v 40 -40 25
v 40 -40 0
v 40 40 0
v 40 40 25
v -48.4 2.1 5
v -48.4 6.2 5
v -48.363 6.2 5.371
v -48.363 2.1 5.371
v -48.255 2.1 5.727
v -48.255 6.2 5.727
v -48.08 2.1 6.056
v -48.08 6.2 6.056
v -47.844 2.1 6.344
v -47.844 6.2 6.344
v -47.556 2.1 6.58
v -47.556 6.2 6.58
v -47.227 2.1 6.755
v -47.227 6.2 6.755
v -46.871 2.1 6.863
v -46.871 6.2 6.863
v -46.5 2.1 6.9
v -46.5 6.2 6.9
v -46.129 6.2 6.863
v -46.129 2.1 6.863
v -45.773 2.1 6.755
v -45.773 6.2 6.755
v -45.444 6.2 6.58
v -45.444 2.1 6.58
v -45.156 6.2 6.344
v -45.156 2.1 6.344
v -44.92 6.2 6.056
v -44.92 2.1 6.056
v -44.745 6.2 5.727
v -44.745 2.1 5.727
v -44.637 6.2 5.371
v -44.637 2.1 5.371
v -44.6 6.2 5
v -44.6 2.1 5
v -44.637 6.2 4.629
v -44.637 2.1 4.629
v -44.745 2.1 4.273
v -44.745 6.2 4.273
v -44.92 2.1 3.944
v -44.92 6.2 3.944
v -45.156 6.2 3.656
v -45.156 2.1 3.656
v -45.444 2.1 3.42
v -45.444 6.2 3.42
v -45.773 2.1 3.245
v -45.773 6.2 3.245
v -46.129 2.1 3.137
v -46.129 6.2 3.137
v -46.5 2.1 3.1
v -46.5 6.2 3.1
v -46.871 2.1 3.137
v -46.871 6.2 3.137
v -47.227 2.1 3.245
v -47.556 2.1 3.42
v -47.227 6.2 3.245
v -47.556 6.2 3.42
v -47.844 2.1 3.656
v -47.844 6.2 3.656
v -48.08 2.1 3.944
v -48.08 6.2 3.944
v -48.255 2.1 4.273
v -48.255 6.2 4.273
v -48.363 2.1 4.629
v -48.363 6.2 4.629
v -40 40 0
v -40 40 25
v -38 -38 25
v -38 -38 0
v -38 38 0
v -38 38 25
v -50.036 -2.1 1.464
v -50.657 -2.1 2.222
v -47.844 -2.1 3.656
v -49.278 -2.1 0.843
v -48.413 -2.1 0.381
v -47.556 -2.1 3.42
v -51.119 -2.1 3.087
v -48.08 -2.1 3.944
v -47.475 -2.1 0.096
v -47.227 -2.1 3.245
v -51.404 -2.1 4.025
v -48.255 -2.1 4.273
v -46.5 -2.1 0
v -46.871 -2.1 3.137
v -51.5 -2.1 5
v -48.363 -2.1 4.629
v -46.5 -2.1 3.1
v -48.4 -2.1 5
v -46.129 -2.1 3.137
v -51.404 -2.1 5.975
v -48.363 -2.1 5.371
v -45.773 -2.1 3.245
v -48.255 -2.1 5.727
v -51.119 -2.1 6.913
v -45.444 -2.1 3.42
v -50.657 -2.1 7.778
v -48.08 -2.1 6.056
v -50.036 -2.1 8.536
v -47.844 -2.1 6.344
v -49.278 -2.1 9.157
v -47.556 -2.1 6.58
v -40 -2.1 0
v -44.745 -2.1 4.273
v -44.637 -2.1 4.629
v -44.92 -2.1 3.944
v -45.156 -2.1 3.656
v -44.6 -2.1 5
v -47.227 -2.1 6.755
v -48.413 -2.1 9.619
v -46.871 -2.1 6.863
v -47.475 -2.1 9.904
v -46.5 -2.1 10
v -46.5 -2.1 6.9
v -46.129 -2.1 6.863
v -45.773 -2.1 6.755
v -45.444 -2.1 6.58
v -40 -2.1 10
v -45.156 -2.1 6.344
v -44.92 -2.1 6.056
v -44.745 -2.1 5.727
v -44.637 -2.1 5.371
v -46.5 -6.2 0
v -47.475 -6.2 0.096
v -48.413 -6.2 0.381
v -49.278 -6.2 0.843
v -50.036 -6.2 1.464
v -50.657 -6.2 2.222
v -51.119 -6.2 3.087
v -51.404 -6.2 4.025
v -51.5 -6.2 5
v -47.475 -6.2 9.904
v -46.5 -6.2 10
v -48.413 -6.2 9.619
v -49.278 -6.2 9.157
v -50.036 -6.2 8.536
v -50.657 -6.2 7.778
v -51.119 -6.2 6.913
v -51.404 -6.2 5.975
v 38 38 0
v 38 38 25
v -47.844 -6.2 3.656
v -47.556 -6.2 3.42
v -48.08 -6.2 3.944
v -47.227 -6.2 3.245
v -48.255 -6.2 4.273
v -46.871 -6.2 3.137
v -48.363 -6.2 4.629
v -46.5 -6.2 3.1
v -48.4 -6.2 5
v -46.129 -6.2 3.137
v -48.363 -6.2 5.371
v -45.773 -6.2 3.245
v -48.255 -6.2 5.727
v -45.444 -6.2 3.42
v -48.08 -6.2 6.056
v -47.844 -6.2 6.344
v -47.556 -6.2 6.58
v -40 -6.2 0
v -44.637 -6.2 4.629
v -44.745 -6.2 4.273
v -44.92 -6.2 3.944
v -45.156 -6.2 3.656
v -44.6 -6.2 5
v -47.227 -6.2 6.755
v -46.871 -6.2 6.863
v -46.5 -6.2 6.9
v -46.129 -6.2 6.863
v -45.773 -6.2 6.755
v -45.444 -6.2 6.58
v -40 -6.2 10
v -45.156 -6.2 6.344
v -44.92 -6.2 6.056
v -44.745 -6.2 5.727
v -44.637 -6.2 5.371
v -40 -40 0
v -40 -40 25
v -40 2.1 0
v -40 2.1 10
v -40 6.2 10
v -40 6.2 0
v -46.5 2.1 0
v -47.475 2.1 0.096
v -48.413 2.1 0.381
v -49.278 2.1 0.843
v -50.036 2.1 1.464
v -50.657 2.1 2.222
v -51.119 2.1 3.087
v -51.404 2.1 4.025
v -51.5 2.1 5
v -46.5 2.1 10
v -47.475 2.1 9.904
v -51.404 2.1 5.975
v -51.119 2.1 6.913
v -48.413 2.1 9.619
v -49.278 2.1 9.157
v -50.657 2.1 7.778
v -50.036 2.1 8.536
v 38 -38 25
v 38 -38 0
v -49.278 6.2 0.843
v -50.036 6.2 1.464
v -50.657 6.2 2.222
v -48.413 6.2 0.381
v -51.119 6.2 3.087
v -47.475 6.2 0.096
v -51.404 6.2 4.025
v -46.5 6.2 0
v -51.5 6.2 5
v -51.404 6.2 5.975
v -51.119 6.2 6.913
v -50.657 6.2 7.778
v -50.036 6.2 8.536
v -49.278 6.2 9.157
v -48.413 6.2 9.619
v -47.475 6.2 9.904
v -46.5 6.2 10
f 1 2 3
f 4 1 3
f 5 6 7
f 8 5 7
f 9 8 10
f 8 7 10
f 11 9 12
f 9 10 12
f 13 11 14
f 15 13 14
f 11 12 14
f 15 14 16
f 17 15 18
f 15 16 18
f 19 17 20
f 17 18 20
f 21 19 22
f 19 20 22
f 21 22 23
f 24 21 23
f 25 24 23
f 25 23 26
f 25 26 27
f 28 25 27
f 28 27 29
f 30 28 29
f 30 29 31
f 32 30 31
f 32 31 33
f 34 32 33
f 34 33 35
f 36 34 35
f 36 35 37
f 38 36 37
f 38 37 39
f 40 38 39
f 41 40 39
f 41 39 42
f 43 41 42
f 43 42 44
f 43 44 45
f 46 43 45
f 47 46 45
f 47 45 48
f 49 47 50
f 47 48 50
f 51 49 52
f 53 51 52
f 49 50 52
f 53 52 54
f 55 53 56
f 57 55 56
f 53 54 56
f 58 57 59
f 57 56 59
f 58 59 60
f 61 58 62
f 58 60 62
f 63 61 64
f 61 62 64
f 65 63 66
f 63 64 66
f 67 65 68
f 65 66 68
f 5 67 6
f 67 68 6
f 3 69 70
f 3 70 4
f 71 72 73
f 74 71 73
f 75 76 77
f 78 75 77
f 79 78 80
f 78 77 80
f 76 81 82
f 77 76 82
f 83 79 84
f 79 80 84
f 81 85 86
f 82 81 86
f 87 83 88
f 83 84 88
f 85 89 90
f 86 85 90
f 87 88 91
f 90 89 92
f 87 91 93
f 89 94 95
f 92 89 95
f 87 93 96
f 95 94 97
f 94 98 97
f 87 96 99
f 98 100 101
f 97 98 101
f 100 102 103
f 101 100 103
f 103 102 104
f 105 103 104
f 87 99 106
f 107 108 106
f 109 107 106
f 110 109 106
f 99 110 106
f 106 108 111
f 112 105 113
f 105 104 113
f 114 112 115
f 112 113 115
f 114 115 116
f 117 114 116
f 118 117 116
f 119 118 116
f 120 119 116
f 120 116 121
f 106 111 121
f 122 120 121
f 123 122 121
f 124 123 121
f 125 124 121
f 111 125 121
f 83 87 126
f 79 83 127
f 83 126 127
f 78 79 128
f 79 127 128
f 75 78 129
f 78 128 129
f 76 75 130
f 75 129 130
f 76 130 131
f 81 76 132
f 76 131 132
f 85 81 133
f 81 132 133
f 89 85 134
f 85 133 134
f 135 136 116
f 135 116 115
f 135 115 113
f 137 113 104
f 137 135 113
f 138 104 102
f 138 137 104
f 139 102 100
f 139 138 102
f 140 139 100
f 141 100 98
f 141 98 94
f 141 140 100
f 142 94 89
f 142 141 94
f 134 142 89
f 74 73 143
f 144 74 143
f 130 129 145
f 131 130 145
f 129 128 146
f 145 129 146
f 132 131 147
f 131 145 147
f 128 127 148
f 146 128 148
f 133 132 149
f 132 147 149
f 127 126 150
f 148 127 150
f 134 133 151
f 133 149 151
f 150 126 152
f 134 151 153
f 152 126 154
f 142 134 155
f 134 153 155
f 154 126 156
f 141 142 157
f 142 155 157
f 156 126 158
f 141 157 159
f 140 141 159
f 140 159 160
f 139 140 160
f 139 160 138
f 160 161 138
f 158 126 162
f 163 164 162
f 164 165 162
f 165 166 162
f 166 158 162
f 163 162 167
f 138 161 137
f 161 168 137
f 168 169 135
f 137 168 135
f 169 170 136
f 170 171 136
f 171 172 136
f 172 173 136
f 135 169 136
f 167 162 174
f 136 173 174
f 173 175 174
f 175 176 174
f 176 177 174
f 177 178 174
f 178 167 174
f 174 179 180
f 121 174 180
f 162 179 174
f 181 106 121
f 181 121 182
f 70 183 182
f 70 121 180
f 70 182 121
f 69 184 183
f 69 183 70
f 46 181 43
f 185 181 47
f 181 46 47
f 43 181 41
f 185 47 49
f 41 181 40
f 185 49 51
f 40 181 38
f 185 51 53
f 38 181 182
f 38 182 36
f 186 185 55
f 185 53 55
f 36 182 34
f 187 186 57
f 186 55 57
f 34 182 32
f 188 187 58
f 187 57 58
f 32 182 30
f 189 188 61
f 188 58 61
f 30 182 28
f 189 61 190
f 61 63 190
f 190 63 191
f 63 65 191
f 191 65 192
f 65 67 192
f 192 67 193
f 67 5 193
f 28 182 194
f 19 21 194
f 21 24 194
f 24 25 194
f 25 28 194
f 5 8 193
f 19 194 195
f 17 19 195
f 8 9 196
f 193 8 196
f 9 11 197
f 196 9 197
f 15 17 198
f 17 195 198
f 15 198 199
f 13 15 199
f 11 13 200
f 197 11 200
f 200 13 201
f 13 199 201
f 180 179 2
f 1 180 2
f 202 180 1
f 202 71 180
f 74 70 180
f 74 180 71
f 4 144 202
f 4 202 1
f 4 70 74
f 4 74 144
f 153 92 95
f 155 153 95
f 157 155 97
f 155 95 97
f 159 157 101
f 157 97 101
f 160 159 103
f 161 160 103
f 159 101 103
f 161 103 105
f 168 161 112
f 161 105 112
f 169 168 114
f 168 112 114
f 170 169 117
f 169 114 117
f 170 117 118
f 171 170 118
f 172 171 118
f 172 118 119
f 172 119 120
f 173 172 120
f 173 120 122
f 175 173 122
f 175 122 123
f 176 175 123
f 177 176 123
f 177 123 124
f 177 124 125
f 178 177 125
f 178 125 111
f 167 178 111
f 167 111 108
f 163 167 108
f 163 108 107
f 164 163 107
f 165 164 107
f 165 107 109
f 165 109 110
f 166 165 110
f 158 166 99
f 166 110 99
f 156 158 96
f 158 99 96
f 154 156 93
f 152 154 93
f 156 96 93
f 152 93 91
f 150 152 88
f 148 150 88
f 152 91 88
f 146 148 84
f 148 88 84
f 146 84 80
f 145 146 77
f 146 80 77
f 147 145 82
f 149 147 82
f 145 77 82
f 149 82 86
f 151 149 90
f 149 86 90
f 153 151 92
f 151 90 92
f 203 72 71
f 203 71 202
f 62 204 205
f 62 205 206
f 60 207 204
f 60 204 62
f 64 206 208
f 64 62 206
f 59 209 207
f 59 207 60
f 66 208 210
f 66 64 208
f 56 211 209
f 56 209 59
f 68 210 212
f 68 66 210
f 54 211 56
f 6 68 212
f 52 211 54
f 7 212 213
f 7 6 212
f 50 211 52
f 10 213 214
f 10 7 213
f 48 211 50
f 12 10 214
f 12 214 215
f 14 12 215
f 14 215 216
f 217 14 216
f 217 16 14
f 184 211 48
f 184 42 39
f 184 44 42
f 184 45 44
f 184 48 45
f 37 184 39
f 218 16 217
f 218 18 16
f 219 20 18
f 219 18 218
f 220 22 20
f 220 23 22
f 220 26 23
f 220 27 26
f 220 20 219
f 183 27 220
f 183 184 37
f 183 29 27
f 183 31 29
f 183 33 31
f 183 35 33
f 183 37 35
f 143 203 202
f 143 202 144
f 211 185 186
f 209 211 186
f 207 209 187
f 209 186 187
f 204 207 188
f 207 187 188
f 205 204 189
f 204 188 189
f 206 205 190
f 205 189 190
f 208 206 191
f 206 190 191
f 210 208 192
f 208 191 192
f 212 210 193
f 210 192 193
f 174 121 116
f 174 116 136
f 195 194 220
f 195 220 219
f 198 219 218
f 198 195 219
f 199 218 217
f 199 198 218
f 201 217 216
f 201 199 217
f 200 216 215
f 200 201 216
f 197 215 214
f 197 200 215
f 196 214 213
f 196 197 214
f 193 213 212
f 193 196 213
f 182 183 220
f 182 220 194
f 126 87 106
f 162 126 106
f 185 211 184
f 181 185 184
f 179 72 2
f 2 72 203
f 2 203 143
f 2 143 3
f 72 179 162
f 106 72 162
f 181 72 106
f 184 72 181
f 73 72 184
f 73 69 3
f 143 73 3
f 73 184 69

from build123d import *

# Parameters (mm, degrees)
F0_W     = 80
F0_H     = 80
F0_W_2   = 76
F0_H_2   = 76
F1_DEPTH = 25
F2_W     = 12.4
F2_H     = 10
F3_DEPTH = 11.5
F4_R     = 4.99999
F5_R     = 1.9
F6_DEPTH = 25
F7_W     = 6.50001
F7_H     = 4.2
F7_W_2   = 4.99999
F8_DEPTH = 25


# Not quite as in the source:
# - a fillet or chamfer is up to 0.001 mm smaller than in the source, because OpenCascade refuses the exact size


with BuildPart() as f1:
    # F0 (on Top) → F1 (new body)
    with BuildSketch(Plane.XY):
        Rectangle(F0_W, F0_H)
        Rectangle(F0_W_2, F0_H_2, mode=Mode.SUBTRACT)
    extrude(amount=F1_DEPTH)

    # F2 (on face) → F3 (join)
    with BuildSketch(Plane(origin=(-40, 0, 0), x_dir=(0, -1, 0), z_dir=(-1, 0, 0))):
        with Locations((0, 5)):
            Rectangle(F2_W, F2_H)
    extrude(amount=F3_DEPTH)

    # F4 (radius 5 in the source; OpenCascade refuses exactly that, so slightly less here)
    f4_edges = [f1.edges().sort_by_distance(p)[0] for p in [
        (-51.5, 0, 10),
        (-51.5, 0, 0),
    ]]
    fillet(f4_edges, radius=F4_R)

    # F5 (on face) → F6 (cut)
    with BuildSketch(Plane(origin=(0, 6.2, 0), x_dir=(-1, 0, 0), z_dir=(0, 1, 0))):
        with Locations((46.5, 5)):
            Circle(F5_R)
    extrude(amount=-F6_DEPTH, mode=Mode.SUBTRACT)

    # F7 (on face) → F8 (cut)
    with BuildSketch(Plane.XY.offset(10)):
        with Locations((-43.250005, 0)):
            Rectangle(F7_W, F7_H)
        with Locations((-49.000005, 0)):
            Rectangle(F7_W_2, F7_H)
    extrude(amount=-F8_DEPTH, mode=Mode.SUBTRACT)


solid = f1.part
